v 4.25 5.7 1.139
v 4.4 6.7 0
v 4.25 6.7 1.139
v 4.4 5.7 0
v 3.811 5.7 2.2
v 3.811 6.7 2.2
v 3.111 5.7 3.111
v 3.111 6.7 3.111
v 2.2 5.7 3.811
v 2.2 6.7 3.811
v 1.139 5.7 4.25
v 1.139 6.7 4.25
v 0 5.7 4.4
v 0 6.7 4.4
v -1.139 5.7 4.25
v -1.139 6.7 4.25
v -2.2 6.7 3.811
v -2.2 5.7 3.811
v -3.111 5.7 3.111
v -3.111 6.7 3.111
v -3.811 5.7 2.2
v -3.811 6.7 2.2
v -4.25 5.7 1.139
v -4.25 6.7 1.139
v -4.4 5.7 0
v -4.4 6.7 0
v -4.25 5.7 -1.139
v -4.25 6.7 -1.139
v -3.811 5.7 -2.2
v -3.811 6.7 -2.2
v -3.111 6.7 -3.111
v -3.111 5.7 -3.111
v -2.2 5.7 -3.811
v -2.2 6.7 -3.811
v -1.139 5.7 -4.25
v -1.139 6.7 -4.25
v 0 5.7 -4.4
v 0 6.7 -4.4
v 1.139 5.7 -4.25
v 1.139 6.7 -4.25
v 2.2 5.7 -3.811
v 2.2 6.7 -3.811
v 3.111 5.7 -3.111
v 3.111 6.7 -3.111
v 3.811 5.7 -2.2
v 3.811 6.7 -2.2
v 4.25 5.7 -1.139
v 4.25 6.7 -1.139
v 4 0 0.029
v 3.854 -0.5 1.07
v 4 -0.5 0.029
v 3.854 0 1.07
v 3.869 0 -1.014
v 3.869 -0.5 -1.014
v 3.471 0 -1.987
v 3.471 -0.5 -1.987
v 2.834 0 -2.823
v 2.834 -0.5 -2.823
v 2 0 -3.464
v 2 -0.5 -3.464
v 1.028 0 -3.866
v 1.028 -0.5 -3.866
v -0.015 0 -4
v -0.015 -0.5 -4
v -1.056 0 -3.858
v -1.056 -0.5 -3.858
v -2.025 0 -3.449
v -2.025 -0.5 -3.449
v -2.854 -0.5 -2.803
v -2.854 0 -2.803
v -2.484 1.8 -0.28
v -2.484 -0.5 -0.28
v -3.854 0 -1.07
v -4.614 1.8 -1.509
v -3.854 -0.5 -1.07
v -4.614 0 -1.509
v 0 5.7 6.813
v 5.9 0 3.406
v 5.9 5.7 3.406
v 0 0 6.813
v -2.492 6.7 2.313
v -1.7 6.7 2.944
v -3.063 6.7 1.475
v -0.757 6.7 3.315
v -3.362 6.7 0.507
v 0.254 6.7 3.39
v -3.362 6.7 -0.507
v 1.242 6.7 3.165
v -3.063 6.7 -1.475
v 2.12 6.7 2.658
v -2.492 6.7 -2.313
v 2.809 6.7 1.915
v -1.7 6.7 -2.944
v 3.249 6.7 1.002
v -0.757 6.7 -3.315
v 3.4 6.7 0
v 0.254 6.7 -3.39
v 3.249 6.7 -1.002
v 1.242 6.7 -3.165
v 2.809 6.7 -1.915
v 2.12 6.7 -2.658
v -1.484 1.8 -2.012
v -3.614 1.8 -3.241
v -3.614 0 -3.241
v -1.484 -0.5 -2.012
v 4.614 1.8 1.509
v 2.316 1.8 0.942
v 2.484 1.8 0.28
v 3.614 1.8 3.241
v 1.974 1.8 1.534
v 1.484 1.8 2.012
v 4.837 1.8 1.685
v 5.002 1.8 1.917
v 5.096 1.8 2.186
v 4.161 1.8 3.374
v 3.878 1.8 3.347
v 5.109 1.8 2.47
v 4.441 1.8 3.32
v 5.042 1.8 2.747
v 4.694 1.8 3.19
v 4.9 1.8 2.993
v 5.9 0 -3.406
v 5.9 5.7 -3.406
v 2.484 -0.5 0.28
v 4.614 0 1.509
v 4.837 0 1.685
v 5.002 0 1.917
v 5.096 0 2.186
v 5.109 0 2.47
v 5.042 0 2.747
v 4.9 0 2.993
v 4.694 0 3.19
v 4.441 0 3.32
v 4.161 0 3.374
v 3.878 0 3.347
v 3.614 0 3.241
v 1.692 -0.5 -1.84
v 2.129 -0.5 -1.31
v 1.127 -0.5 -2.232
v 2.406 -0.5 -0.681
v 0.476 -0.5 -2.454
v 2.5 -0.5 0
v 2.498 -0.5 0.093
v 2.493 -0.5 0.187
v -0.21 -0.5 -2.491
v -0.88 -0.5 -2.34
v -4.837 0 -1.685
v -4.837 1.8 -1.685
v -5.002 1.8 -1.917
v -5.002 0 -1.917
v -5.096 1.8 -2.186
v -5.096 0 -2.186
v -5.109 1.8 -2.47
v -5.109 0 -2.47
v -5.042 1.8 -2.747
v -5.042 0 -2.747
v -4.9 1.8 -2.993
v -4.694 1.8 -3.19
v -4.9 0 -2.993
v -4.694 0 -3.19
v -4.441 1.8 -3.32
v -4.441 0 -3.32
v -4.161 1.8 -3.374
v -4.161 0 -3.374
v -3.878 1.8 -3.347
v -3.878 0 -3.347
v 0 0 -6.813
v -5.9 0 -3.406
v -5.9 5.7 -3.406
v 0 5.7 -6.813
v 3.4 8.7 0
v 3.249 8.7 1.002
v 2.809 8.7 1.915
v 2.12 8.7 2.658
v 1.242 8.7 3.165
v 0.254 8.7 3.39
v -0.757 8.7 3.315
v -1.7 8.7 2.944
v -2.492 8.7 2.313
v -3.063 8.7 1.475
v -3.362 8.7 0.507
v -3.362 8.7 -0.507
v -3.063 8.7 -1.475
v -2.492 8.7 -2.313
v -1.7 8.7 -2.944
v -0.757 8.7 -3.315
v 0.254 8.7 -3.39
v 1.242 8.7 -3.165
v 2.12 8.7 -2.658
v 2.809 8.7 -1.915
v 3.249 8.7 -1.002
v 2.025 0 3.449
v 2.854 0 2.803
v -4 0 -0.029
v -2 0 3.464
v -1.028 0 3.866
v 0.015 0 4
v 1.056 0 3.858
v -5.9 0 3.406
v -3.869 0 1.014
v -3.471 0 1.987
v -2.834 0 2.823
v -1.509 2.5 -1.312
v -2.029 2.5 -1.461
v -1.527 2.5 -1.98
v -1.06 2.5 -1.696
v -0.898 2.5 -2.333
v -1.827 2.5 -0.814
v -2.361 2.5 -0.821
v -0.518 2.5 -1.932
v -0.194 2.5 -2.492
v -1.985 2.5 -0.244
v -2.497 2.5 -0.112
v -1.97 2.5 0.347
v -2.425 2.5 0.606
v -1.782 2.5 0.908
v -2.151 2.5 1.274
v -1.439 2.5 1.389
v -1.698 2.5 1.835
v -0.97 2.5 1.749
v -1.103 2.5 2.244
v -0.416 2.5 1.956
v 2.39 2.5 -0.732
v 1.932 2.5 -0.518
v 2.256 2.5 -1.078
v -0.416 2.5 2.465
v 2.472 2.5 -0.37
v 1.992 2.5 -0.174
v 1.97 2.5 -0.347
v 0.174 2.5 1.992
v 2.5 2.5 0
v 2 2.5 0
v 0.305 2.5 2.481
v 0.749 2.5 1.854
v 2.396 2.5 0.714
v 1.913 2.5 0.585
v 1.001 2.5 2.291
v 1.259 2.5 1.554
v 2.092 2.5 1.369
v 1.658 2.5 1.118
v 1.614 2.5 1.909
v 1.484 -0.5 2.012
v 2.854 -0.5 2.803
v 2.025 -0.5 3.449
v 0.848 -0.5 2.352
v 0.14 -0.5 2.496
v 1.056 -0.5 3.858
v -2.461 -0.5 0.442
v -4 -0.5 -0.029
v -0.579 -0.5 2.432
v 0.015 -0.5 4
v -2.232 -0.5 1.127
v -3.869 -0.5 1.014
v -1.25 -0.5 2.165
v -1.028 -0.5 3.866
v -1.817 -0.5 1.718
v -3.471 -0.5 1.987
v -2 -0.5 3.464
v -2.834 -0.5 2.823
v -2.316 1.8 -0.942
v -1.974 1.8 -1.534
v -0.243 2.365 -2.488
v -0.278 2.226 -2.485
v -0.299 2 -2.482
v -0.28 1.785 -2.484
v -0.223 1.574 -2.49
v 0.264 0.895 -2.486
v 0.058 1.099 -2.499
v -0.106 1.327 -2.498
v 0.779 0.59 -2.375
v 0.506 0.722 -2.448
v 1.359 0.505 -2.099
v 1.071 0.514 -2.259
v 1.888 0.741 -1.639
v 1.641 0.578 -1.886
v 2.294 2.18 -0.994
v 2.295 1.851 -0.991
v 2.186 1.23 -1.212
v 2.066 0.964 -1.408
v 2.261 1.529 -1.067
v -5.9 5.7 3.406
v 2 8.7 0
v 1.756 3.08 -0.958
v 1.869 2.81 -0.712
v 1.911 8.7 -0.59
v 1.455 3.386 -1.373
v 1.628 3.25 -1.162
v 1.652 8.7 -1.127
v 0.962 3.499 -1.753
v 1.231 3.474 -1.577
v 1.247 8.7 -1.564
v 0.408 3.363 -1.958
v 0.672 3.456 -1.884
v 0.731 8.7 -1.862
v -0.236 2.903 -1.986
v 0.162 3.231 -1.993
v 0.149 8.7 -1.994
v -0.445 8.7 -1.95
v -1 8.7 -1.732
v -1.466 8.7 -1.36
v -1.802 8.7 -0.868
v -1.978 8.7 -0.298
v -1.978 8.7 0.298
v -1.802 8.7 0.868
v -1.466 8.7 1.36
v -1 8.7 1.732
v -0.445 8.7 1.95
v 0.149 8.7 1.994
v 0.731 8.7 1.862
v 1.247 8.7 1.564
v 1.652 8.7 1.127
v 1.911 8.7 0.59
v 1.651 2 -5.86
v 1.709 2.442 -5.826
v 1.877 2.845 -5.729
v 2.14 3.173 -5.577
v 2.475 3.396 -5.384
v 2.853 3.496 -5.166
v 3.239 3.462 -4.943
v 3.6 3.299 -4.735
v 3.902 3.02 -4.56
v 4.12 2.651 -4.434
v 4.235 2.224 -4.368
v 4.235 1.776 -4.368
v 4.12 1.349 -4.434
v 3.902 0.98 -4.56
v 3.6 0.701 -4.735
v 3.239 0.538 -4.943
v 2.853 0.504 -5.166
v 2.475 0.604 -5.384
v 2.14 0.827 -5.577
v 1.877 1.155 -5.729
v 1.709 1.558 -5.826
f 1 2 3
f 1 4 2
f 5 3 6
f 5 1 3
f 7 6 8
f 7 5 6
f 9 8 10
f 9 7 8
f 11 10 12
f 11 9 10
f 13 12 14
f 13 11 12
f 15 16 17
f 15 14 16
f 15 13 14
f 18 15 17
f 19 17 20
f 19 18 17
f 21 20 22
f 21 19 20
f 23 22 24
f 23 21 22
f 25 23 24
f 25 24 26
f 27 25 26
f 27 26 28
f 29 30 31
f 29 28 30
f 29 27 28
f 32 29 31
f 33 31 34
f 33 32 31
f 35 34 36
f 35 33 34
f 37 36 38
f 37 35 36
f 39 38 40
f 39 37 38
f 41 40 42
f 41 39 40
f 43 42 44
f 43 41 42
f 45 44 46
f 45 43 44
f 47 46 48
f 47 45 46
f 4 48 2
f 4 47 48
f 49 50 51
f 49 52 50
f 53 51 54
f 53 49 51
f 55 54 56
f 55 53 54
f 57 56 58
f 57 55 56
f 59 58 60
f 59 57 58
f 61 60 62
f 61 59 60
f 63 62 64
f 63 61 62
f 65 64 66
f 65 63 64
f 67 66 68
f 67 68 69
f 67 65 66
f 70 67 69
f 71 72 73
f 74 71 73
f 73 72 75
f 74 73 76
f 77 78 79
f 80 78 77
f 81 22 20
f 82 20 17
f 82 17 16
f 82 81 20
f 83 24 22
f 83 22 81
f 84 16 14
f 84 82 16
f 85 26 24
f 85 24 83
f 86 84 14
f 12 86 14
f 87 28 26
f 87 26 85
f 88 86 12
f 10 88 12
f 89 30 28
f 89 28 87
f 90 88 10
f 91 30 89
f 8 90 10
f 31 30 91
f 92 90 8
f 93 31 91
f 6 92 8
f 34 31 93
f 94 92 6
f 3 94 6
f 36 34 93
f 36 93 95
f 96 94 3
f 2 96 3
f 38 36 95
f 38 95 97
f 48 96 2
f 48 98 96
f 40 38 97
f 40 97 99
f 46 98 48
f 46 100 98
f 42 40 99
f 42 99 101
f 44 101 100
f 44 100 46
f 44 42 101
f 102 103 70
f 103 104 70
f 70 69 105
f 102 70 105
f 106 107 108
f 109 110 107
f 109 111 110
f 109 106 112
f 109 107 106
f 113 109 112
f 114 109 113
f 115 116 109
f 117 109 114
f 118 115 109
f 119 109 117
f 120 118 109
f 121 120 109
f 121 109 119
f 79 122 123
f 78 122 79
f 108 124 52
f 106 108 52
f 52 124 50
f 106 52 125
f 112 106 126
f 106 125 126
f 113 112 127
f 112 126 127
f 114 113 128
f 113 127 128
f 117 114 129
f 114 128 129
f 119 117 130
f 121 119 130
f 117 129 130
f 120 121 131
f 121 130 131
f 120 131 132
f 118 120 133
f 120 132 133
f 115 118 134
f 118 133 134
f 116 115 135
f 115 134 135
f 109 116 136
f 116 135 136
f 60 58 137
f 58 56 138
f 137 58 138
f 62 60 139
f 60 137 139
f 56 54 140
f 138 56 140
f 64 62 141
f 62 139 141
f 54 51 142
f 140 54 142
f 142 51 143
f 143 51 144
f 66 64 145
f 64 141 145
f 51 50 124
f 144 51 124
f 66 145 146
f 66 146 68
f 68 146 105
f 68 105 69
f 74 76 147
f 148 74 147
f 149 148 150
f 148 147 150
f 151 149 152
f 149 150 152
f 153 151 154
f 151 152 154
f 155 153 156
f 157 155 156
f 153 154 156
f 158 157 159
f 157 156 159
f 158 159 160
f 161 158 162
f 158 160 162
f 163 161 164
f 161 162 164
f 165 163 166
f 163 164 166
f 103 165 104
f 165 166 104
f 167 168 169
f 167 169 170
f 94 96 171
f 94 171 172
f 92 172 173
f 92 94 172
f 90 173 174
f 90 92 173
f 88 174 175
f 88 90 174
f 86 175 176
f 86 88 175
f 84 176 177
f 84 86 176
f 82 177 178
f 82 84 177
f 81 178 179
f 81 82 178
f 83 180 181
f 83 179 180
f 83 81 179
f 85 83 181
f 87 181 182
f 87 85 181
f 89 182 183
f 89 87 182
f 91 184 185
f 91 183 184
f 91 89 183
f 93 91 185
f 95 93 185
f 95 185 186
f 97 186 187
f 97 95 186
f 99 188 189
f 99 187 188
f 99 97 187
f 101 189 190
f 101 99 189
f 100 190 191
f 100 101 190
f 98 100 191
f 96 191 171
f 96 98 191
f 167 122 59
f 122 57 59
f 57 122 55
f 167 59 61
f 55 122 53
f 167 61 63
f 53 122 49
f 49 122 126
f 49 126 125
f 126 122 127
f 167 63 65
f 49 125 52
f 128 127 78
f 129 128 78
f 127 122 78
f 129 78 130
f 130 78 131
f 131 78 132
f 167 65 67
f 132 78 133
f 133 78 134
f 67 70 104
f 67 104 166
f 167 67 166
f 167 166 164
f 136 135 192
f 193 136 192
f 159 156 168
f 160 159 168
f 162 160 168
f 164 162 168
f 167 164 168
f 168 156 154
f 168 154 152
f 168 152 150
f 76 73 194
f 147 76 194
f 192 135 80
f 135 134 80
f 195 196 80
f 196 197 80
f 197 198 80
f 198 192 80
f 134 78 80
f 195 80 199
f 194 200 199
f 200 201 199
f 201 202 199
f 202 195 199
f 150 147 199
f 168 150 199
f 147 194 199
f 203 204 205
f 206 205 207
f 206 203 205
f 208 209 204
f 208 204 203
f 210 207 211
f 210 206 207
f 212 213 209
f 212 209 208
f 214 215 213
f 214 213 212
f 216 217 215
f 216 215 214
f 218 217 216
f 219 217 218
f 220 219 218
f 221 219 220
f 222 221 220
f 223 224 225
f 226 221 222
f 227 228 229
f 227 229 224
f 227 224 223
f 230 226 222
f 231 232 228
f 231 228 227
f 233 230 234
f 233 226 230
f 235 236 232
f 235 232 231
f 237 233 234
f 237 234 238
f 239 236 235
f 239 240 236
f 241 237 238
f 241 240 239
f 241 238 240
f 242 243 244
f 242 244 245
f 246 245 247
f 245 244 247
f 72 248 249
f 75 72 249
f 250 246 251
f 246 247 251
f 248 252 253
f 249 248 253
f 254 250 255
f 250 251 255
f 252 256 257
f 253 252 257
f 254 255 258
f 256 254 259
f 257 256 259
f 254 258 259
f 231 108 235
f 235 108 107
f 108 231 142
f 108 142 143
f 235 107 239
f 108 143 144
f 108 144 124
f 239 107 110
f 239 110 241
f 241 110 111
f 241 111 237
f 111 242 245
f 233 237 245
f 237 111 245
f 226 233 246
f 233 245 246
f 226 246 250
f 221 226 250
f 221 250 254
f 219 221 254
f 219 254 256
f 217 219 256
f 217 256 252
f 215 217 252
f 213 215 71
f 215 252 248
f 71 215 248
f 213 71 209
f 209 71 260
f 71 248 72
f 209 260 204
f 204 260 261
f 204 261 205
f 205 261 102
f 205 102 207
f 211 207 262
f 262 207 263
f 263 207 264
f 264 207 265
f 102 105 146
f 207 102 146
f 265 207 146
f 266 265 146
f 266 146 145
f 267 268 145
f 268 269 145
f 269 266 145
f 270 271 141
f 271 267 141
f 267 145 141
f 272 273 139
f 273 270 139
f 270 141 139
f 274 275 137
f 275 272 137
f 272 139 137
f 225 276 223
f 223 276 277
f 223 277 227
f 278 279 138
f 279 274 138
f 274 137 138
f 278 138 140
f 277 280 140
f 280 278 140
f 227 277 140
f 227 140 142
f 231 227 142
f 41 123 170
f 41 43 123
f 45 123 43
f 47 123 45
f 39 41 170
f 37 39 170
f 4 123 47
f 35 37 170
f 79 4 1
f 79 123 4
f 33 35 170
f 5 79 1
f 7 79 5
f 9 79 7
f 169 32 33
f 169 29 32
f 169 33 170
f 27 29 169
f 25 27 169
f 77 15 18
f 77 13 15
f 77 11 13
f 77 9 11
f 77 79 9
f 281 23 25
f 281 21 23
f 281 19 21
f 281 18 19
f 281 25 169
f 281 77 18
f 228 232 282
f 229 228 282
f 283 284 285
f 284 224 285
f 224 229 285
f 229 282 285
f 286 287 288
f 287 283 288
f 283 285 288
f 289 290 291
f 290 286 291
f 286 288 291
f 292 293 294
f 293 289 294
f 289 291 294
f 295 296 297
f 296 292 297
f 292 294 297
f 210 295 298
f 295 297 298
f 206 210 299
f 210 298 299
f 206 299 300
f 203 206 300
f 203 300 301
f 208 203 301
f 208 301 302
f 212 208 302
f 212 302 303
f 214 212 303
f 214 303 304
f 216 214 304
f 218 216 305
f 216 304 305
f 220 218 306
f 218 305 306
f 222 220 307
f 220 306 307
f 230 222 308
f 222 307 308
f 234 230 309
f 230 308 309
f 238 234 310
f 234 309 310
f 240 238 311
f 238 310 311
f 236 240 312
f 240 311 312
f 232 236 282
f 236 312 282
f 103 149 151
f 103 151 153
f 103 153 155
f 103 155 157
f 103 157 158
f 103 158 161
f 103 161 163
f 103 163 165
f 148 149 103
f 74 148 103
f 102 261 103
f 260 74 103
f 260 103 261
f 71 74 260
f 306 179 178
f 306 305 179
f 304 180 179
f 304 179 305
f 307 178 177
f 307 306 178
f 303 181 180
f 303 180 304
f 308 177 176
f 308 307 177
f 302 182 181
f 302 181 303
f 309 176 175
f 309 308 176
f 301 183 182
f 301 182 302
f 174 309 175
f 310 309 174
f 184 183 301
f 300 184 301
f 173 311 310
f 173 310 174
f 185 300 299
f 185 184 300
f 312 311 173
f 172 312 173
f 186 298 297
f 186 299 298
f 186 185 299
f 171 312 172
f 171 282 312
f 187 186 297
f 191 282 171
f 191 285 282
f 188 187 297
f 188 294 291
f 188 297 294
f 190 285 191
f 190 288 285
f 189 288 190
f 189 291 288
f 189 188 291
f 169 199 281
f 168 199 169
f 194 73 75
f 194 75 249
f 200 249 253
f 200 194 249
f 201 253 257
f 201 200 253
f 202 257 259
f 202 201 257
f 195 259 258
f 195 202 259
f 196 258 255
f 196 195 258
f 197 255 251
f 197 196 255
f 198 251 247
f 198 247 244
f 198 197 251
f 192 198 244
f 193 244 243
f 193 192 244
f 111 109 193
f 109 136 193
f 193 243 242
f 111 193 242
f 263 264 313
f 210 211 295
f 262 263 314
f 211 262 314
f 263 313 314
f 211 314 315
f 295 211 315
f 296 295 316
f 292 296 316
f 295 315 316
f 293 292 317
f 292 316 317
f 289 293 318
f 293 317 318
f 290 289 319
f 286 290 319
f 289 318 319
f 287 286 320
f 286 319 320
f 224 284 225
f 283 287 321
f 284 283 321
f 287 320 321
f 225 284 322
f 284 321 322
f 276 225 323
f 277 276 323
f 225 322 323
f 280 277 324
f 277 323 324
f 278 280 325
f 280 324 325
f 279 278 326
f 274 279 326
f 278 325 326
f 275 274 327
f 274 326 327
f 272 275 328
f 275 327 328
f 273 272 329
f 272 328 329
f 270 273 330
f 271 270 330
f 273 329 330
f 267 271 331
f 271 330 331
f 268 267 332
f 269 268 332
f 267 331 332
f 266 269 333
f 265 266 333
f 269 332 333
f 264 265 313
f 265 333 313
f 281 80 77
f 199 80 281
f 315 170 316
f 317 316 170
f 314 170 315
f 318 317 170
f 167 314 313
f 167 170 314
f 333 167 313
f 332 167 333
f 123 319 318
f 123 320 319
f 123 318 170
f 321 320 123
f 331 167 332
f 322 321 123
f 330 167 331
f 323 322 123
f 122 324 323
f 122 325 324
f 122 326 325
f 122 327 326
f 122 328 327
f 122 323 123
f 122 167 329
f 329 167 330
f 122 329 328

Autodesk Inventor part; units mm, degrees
ref_plane "YZ Plane" through (0, 0, 0) normal (1, 0, 0) x (0, 1, 0)
ref_plane "XZ Plane" through (0, 0, 0) normal (0, 1, 0) x (-1, 0, 0)
ref_plane "XY Plane" through (0, 0, 0) normal (0, 0, 1) x (1, 0, 0)
sketch "Sketch1" plane through (0, 0, 0) normal (0, 1, 0) x (-1, 0, 0)
  line L0 (0, -6.8127) -> (-5.9, -3.4064)
  line L1 (-5.9, -3.4064) -> (-5.9, 3.4064)
  line L2 (-5.9, 3.4064) -> (0, 6.8127)
  line L3 (0, 6.8127) -> (5.9, 3.4064)
  line L4 (5.9, 3.4064) -> (5.9, -3.4064)
  line L5 (5.9, -3.4064) -> (0, -6.8127)
  line L6 (0, -9.5378) -> (0, 9.5378) projected
  point P0 (0, 0)
  point P1 (0, 0)
  dimension "d0" = 11.8
extrude "Extrusion1" add sketch "Sketch1" along normal blind 5.7
sketch "Sketch2" plane through (0, 5.7, 0) normal (0, 1, 0) x (1, 0, 0)
  circle A0 centre (0, 0) radius 4.4
  dimension "d3" = 8.8
extrude "Extrusion2" add sketch "Sketch2" along normal blind 1
sketch "Sketch3" plane through (0, 6.7, 0) normal (0, 1, 0) x (1, 0, 0)
  circle A0 centre (0, 0) radius 3.4
  dimension "d6" = 6.8
extrude "Extrusion3" add sketch "Sketch3" along normal blind 2
sketch "Sketch4" plane through (0, 0, 0) normal (0, 1, 0) x (-1, 0, 0)
  circle A0 centre (0, 0) radius 4
  dimension "d9" = 8
extrude "Extrusion4" add sketch "Sketch4" against normal blind 0.5
sketch "Sketch5" plane through (0, -0.5, 0) normal (0, -1, 0) x (1, 0, 0)
  circle A0 centre (0, 0) radius 2.5
  dimension "d12" = 5
extrude "Extrusion5" cut sketch "Sketch5" against normal blind 3
sketch "Sketch6" plane through (0, 8.7, 0) normal (0, 1, 0) x (1, 0, 0)
  circle A0 centre (0, 0) radius 2
  dimension "d15" = 4
extrude "Extrusion6" cut sketch "Sketch6" against normal up to next
sketch "Sketch7" plane through (0, -0.5, 0) normal (0, -1, 0) x (1, 0, 0)
  line L0 (-4.1136, -2.375) -> (4.1136, 2.375) construction
  line L1 (-3.6136, -3.241) -> (4.6136, 1.509)
  line L2 (3.6136, 3.241) -> (-4.6136, -1.509)
  arc A0 (-4.6136, -1.509) -> (-3.6136, -3.241) centre (-4.1136, -2.375) ccw
  arc A1 (4.6136, 1.509) -> (3.6136, 3.241) centre (4.1136, 2.375) ccw
  line L3 (0, 6.8127) -> (-5.9, 3.4064) projected
  point P0 (0, 0)
  point P1 (0, 0)
  dimension "d18" = 11.5
  dimension "d19" = 2
extrude "Extrusion7" cut sketch "Sketch7" against normal blind 2.3
sketch "Sketch8" plane through (0, 0, -6.8127) normal (0.5, 0, -0.8660254) x (-0.8660254, 0, -0.5)
  line L0 (0, 0) -> (0, 5.7) construction
  line L1 (-6.8127, 0) -> (-6.8127, 5.7) construction
  circle A0 centre (-3.4064, 2) radius 1.5
  line L2 (9.6112, 0) -> (-21.9003, 0) projected
  point P0 (-3.4064, 0)
  dimension "d23" = 3
  dimension "d24" = 2
  dimension "d25" = 0
extrude "Extrusion8" cut sketch "Sketch8" against normal up to surface
thread "Thread1" size "M3x0.5" class "6H" standard "ANSI Metric M Profile" full length
properties part number "RCT-H009_tuerca"
